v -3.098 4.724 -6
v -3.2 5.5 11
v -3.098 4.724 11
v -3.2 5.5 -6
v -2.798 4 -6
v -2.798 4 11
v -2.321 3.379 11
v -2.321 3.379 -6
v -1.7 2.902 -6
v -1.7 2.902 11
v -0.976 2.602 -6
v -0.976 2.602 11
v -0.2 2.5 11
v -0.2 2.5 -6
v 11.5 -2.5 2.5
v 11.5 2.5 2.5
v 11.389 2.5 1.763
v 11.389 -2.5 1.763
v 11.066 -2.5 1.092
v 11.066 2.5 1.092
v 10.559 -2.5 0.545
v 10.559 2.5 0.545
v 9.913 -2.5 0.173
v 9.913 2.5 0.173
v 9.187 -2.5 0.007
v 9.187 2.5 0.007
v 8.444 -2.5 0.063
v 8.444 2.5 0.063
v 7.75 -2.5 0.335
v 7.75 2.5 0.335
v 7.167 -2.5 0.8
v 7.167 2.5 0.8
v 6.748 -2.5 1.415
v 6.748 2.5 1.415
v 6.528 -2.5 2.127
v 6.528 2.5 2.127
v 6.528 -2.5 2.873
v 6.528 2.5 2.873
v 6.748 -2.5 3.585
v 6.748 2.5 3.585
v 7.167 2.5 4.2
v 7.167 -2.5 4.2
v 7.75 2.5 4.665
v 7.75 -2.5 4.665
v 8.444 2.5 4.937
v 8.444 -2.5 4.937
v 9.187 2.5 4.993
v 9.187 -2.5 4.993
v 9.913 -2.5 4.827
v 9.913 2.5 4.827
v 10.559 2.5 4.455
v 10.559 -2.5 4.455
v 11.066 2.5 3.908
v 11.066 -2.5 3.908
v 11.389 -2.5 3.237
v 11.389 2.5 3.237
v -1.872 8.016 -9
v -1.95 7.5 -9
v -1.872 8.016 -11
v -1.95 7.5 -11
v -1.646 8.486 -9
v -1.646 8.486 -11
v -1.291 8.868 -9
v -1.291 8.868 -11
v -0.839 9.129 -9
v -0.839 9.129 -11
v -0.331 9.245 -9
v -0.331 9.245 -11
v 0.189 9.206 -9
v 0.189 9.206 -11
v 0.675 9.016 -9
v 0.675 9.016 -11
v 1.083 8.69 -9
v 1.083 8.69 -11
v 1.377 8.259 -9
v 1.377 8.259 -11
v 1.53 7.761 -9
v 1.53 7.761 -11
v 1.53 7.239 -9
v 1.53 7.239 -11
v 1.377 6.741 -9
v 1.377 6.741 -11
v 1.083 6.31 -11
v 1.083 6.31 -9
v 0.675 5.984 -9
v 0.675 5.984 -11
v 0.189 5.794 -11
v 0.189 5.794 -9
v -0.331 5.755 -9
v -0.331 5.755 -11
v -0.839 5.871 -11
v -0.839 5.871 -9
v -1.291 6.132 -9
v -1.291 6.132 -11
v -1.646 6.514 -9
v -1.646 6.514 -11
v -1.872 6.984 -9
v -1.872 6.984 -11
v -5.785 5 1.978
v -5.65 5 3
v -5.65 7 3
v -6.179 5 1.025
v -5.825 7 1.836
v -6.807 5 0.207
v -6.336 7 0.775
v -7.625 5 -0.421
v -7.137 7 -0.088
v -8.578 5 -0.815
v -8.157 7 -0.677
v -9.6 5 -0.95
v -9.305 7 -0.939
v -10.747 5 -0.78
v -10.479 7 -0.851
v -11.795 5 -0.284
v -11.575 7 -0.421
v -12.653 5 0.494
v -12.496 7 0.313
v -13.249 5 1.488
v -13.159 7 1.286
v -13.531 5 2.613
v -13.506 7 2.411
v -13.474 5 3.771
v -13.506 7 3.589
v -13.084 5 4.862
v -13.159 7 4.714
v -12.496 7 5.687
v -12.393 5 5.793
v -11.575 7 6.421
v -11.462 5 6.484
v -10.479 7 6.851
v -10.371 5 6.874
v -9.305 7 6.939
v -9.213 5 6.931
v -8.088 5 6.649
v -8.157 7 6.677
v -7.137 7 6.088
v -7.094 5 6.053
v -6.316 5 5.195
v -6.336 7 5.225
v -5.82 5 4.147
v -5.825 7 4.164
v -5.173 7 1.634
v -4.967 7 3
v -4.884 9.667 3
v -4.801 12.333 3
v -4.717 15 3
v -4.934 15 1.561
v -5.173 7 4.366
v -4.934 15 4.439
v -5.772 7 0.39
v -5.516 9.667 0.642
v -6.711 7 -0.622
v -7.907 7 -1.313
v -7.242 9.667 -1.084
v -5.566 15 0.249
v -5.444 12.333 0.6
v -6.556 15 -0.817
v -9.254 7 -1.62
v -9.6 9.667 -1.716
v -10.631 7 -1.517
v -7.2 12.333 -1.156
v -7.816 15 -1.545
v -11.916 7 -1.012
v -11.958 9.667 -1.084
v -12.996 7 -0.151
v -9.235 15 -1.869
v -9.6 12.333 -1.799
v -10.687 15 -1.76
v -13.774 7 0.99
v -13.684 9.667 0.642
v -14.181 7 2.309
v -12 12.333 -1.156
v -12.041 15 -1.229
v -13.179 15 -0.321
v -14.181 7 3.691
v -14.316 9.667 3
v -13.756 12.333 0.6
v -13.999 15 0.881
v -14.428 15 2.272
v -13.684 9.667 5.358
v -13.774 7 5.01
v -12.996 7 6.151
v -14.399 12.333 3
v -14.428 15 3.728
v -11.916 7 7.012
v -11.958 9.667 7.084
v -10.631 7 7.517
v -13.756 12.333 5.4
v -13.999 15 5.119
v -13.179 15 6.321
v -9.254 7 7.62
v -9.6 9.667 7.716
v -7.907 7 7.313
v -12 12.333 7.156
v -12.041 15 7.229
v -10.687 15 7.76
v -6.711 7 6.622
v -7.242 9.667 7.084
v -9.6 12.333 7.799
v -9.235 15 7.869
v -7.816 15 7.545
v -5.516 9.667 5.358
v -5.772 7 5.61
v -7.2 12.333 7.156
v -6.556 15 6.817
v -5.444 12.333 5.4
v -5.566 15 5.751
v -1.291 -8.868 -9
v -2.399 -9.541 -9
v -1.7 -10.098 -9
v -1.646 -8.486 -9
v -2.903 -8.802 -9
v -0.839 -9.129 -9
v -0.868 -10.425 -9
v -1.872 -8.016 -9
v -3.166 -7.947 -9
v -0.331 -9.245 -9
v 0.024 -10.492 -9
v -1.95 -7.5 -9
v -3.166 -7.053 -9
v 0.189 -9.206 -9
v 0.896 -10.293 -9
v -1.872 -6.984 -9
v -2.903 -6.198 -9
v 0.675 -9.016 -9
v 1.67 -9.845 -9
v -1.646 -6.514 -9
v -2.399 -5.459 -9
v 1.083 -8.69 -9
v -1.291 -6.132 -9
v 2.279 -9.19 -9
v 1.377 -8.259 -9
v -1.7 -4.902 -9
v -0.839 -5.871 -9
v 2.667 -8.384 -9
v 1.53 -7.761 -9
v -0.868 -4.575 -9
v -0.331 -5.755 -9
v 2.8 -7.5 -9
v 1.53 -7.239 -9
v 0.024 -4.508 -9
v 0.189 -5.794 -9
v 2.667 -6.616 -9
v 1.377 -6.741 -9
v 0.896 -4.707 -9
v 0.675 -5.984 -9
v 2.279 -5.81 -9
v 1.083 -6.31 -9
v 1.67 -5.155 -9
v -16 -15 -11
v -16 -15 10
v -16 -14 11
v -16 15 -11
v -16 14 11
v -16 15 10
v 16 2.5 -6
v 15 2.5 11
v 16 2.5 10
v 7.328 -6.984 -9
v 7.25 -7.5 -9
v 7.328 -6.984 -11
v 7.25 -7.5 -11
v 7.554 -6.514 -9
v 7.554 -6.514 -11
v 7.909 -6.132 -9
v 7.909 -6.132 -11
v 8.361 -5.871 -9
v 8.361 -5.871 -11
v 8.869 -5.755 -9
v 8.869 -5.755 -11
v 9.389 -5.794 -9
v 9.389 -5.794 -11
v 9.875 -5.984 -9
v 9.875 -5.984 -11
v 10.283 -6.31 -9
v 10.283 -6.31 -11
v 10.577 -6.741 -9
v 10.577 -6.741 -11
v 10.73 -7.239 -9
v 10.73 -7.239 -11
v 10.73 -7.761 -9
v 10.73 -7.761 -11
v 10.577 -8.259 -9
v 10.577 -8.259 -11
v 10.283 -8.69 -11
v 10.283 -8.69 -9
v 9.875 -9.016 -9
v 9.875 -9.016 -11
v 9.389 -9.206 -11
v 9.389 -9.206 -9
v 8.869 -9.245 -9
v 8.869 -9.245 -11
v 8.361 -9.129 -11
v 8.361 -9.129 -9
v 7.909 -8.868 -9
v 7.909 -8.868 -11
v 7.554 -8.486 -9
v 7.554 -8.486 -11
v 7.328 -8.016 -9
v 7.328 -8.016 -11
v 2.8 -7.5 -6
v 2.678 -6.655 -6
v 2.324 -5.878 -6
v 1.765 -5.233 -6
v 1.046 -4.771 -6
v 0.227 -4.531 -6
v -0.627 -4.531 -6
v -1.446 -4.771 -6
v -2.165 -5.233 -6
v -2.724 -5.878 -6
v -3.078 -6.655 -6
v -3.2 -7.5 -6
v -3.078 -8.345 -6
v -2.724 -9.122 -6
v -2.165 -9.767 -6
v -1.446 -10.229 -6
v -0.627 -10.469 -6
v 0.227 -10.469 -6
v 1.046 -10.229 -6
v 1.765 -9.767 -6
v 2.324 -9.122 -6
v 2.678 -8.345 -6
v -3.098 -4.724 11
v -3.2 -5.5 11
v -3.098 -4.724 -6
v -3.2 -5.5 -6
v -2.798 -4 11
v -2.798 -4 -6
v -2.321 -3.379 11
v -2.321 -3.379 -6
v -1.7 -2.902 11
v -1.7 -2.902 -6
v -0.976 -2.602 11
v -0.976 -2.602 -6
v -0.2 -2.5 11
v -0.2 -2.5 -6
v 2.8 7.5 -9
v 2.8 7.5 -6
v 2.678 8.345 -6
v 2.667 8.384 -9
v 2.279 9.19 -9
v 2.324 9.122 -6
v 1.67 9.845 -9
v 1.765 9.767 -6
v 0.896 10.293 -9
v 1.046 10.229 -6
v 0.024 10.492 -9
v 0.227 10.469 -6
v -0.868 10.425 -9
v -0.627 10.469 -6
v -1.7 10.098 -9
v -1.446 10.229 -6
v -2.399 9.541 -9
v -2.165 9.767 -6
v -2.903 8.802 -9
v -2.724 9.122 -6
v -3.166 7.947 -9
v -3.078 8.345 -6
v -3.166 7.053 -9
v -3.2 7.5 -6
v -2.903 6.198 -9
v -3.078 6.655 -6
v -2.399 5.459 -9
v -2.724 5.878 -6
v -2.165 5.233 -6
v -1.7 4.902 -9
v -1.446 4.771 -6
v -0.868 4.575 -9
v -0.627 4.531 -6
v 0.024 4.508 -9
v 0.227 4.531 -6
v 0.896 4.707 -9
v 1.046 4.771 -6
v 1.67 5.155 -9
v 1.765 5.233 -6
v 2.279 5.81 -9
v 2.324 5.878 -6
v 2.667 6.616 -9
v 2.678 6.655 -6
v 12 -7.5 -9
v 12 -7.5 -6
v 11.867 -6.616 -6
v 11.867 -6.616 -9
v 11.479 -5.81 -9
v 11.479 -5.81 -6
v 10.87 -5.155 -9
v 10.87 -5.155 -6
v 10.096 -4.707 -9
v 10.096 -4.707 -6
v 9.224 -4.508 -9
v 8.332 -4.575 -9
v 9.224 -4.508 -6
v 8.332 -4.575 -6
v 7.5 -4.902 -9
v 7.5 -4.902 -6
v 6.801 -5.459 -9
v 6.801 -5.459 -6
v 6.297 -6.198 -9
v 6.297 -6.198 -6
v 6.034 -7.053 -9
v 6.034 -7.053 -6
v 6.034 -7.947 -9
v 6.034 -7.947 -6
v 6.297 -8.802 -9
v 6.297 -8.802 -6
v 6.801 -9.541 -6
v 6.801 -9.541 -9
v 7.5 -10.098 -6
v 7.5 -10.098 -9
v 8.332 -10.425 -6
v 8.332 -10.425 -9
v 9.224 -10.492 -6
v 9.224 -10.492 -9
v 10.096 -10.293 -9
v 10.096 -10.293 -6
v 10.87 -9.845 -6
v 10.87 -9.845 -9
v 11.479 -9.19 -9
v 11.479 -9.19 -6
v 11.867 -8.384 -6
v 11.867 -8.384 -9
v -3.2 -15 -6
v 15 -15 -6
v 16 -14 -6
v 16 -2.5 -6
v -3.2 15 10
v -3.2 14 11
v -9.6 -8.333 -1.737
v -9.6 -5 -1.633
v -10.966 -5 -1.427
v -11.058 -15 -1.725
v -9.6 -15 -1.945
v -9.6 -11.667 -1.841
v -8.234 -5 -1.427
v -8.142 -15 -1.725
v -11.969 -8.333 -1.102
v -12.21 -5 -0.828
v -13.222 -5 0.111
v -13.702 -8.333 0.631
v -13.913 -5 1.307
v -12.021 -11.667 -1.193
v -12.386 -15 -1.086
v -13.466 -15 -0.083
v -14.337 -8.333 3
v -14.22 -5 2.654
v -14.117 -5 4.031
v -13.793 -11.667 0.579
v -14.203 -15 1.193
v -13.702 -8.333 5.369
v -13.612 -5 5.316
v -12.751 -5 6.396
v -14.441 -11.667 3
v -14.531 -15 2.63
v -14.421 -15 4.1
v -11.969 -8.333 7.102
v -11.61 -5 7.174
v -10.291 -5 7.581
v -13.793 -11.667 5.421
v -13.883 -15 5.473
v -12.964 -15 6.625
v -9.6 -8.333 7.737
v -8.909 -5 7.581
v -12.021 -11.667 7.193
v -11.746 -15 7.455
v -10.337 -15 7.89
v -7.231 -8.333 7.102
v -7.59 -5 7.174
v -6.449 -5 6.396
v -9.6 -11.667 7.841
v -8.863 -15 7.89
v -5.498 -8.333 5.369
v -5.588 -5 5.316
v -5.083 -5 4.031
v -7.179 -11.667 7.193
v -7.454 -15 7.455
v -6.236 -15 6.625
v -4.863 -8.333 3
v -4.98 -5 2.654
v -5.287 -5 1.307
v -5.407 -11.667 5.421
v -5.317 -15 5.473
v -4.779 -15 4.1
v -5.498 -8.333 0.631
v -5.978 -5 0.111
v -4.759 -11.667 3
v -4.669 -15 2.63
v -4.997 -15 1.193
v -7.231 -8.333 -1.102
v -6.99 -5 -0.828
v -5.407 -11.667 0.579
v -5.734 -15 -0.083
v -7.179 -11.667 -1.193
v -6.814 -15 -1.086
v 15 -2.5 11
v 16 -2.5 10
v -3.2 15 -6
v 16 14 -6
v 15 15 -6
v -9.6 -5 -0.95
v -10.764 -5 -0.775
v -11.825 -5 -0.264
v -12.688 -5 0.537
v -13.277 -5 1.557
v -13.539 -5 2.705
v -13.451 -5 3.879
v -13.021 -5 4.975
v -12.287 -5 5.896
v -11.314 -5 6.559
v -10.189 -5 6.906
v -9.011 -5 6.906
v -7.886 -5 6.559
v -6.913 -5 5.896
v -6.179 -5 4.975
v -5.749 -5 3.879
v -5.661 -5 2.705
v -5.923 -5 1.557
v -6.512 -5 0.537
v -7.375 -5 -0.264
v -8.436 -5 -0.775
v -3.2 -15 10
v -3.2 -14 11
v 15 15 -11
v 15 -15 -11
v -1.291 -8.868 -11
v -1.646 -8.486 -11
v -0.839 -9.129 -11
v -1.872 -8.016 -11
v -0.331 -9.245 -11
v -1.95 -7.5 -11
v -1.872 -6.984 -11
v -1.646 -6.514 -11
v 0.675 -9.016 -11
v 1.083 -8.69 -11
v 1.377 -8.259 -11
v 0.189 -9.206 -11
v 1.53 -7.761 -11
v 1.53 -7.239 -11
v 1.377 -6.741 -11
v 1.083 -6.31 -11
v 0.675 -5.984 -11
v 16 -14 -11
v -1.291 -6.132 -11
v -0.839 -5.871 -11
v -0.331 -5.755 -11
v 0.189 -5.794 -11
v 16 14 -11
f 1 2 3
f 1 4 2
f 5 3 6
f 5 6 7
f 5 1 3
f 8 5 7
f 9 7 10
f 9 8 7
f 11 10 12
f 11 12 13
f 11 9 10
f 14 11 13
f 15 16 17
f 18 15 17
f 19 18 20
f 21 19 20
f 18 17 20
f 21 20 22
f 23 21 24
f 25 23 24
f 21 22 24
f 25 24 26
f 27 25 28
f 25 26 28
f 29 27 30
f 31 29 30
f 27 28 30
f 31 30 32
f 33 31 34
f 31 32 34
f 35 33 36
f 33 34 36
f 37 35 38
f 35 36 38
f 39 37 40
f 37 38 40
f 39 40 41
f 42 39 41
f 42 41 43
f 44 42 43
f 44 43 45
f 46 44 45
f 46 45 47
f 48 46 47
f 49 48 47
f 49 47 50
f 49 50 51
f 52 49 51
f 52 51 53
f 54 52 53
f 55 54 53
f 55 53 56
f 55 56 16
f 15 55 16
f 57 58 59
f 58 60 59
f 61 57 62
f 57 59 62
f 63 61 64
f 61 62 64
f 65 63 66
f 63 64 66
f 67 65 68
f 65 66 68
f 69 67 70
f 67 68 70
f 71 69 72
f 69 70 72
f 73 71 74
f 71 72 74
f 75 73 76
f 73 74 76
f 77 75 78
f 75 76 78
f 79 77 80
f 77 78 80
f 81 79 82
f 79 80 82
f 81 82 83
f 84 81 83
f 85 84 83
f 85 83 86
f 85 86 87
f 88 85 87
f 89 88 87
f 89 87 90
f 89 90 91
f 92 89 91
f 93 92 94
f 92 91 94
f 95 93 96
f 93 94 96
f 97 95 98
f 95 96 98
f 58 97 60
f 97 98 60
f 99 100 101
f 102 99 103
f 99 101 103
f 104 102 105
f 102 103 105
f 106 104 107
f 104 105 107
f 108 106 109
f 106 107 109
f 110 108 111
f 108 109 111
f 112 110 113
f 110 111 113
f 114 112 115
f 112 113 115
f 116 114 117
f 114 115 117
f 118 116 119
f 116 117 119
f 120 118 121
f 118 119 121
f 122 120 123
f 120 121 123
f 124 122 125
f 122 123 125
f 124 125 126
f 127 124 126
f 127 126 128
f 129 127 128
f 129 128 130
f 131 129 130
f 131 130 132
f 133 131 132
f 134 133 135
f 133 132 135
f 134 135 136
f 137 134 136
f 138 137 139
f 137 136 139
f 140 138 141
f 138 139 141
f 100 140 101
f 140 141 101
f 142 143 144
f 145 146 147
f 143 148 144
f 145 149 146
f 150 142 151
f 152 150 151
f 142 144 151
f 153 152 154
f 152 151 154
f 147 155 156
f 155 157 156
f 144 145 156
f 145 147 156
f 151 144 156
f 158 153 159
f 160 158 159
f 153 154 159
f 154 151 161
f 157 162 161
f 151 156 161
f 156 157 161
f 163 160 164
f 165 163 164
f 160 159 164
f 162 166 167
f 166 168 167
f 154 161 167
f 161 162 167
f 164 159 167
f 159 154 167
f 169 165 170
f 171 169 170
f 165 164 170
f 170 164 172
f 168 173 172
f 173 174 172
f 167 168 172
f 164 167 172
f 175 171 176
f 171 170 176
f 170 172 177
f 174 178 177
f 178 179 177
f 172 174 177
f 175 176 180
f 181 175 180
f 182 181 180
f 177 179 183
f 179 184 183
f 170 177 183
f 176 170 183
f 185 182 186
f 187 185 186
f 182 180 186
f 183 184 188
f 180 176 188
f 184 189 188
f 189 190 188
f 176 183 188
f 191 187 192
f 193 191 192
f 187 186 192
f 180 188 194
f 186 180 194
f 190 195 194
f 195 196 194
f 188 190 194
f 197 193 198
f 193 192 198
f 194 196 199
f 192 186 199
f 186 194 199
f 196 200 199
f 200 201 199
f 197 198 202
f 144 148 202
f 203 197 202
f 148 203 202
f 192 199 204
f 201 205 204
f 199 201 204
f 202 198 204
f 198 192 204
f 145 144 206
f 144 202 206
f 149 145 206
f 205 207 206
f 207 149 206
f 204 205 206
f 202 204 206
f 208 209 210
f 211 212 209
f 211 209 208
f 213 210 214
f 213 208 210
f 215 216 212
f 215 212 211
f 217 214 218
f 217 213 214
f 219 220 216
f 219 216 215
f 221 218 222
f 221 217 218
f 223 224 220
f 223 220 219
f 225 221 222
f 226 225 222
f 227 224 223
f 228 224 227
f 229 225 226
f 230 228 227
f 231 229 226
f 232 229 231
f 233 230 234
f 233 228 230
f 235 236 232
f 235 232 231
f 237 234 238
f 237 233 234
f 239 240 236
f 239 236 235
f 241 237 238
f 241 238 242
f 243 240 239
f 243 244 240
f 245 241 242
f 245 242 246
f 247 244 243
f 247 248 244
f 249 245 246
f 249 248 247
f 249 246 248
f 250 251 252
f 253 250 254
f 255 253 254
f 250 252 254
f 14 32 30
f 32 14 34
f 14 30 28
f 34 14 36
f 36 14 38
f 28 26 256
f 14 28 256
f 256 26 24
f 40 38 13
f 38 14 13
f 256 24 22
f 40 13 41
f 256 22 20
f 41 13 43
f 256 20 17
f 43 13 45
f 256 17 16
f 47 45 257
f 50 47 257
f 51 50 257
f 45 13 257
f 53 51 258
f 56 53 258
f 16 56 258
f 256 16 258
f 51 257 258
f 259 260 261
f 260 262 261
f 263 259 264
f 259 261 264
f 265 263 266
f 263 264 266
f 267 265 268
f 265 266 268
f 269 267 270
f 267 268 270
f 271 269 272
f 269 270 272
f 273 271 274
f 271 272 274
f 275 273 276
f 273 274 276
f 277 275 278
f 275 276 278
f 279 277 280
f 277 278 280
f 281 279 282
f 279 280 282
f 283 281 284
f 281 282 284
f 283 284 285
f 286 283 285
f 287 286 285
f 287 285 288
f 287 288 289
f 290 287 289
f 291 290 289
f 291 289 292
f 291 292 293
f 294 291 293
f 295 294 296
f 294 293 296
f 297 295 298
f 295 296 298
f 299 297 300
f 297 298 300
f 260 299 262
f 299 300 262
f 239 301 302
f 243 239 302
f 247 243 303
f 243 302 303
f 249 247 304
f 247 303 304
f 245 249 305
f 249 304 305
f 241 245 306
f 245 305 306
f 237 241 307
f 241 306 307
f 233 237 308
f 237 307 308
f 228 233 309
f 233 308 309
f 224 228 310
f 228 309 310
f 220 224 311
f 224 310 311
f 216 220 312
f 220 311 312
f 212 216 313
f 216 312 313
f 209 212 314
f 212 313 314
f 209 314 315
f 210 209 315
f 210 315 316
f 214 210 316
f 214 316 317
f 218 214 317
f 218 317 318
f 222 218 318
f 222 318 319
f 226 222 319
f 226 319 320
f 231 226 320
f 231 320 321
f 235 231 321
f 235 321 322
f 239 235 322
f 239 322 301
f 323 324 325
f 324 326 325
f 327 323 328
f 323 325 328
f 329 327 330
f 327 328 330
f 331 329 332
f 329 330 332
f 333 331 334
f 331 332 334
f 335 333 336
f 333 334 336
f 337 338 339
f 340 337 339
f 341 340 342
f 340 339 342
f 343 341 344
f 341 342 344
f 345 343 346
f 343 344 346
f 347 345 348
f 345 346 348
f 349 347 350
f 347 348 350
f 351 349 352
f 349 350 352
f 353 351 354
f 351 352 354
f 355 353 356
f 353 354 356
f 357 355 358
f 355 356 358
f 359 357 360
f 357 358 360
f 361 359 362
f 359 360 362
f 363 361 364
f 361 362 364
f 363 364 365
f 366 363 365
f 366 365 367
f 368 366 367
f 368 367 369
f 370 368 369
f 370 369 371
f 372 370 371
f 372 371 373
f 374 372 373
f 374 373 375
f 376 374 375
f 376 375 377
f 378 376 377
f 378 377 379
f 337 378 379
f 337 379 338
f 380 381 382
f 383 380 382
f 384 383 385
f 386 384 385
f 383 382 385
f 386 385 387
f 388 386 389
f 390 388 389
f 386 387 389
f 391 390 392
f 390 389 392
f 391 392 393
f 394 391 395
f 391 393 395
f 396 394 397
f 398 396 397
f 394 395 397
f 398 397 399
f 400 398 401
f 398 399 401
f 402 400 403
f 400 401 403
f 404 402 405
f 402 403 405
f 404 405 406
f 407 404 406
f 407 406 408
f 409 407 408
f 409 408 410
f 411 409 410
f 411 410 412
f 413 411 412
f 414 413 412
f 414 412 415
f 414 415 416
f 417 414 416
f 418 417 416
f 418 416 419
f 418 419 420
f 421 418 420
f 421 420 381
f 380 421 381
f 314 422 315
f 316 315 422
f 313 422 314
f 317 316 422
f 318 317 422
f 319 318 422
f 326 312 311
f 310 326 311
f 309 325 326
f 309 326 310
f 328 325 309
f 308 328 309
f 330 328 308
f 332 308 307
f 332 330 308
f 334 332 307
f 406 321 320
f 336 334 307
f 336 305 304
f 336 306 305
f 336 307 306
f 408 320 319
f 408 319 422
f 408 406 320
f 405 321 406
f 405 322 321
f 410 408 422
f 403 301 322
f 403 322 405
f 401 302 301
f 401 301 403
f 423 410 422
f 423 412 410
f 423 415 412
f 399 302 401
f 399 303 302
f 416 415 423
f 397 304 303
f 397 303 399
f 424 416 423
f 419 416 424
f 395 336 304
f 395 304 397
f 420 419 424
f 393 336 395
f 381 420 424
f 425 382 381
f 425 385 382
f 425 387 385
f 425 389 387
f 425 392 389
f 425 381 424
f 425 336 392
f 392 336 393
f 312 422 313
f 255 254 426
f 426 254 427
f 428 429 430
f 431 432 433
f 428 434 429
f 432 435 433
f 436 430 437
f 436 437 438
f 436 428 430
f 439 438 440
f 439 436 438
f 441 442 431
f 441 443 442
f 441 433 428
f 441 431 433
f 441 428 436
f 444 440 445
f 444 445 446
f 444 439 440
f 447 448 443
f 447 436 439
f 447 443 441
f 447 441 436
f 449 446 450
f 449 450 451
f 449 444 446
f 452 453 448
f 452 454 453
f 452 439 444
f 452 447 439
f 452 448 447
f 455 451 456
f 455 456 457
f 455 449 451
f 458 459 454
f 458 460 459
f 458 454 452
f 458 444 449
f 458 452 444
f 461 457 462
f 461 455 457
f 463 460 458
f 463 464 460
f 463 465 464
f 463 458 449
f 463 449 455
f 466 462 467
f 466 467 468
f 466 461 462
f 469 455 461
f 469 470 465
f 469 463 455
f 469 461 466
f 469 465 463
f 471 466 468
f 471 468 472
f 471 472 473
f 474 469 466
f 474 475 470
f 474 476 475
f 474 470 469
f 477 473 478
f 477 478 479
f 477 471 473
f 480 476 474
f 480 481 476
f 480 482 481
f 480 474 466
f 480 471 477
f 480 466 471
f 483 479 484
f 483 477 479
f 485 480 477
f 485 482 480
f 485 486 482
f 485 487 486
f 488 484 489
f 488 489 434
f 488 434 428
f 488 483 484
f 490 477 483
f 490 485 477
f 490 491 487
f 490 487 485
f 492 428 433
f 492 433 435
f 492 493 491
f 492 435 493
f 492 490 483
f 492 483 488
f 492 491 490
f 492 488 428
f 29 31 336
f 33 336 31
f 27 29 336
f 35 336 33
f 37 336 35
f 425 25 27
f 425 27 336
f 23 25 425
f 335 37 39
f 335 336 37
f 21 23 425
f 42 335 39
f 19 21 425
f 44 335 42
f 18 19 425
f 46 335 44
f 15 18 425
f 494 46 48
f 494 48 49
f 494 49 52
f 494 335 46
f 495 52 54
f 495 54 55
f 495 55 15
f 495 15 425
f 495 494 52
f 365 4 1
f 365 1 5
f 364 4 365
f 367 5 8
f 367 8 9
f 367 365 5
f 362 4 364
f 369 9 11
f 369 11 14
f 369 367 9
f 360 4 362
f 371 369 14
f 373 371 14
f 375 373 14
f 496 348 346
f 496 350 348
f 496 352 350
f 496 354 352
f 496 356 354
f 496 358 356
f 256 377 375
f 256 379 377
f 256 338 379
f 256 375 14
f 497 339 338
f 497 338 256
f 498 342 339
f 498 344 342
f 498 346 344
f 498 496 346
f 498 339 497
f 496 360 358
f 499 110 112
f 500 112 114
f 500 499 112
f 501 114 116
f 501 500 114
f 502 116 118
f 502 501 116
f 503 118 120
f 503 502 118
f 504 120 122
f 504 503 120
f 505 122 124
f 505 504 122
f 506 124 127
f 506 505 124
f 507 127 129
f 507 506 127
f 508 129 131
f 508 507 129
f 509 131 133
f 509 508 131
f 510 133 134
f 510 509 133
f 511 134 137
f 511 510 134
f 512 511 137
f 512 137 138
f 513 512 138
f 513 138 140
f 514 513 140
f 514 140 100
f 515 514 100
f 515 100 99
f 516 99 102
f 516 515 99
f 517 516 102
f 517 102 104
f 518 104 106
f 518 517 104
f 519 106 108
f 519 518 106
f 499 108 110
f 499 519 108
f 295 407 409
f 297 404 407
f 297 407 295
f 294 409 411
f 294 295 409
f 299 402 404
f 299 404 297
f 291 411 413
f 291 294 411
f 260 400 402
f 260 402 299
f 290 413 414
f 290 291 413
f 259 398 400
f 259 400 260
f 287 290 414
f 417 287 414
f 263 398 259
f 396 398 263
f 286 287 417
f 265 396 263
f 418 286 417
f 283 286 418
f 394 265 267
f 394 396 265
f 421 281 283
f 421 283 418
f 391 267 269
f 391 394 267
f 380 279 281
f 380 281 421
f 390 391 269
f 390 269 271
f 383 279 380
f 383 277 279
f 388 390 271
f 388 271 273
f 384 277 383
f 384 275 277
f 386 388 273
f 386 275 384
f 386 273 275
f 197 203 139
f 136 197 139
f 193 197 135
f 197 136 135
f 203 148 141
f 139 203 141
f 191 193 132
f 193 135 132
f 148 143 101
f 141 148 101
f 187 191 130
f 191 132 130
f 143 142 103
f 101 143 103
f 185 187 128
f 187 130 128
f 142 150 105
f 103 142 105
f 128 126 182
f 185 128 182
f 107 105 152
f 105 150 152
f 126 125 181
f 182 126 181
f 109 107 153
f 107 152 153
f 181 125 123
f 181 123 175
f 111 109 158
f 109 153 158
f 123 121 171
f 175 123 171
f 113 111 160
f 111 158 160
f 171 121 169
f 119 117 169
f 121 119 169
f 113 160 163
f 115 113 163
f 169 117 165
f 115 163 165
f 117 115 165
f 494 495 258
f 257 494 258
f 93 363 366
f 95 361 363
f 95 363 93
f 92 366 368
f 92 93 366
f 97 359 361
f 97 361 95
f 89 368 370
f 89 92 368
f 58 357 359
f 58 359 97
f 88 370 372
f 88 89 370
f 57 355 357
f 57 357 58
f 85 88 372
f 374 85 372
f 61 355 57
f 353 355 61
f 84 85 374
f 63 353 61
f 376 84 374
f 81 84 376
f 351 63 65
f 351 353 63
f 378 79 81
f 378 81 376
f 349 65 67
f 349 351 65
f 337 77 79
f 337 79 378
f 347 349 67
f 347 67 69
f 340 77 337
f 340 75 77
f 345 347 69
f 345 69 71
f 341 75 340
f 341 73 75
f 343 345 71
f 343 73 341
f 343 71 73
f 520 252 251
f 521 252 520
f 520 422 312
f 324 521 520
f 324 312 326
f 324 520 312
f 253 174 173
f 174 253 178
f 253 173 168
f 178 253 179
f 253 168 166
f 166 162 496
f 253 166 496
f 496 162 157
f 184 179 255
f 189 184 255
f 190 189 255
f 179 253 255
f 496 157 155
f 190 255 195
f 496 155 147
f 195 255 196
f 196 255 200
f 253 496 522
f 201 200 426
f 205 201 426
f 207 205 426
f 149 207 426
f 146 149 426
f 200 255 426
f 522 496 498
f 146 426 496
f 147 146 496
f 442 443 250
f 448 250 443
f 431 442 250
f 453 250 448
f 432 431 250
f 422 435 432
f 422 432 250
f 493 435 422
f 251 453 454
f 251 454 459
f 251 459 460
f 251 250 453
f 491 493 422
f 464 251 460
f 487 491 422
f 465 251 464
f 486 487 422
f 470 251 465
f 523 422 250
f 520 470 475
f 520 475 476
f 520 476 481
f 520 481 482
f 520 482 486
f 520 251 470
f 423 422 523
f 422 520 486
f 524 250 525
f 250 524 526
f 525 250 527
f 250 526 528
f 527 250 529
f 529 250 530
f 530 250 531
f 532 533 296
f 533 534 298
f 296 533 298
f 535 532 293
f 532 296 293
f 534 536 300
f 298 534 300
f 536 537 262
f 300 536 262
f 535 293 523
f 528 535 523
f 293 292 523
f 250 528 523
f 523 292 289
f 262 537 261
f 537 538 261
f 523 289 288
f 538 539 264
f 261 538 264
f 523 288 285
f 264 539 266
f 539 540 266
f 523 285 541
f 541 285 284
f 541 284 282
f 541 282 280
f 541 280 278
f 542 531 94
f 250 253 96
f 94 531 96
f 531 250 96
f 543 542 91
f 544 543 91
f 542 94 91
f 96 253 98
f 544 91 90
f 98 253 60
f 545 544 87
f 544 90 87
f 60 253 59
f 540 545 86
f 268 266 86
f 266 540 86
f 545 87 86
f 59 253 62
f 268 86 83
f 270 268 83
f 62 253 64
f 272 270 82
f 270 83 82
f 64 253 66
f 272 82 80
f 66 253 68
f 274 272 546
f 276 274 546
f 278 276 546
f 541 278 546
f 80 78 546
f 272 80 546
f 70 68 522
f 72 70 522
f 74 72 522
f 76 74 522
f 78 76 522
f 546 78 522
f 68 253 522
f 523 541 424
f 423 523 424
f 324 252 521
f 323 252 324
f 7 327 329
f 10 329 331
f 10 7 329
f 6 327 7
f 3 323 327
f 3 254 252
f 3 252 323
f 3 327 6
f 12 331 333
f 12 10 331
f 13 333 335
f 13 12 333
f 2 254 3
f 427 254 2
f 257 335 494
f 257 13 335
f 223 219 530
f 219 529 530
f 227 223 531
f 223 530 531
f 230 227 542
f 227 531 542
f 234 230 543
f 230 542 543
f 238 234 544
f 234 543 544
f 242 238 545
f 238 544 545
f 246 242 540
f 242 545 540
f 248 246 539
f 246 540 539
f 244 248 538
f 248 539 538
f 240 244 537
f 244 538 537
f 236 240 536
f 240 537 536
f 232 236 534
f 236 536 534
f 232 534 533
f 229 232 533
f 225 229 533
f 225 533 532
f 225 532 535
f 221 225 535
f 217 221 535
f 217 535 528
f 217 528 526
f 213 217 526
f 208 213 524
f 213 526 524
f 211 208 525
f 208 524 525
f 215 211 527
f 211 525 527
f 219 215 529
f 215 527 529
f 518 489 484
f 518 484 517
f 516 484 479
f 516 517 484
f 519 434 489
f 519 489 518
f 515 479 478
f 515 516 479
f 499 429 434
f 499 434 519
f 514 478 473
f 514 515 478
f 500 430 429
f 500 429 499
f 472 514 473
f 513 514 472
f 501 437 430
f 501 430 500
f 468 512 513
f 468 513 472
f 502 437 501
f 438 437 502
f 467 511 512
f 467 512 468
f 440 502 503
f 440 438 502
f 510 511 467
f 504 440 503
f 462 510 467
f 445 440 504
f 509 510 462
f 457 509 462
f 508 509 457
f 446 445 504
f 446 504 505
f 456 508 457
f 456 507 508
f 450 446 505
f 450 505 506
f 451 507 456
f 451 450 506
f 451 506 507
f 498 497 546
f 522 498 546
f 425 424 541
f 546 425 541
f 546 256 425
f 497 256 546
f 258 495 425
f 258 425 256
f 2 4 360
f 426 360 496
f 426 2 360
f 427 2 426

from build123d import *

# Parameters (mm, degrees)
SKETCH_2_W                = 32
SKETCH_2_H                = 30
EXTRUDE_1_DEPTH           = 11
HOLE_WIZARD_1_D           = 3.5
HOLE_WIZARD_1_CBORE_D     = 6
HOLE_WIZARD_1_CBORE_DEPTH = 20
SKETCH_11_W               = 19.2
SKETCH_11_H               = 12.5
CUT_EXTRUDE_1_DEPTH       = 17
HOLE_WIZARD_M6_1_D        = 5
CHAMFER_1_SIZE            = 1
FILLET_1_R                = 3


# Read off the part's stored shape, not the designer's step: 1/8 Rc 螺纹孔1
with BuildPart() as part:
    # 草图2 → 凸台-拉伸1 (new, symmetric)
    with BuildSketch(Plane.XY):
        Rectangle(SKETCH_2_W, SKETCH_2_H)
    extrude(amount=EXTRUDE_1_DEPTH, both=True)

    # 打孔尺寸根据内六角圆柱头螺钉的类型1 (through all)
    with Locations(Plane.XY.offset(11)):
        with Locations((-0.2, 7.5), (-0.2, -7.5), (9, -7.5)):
            CounterBoreHole(HOLE_WIZARD_1_D / 2, HOLE_WIZARD_1_CBORE_D / 2, HOLE_WIZARD_1_CBORE_DEPTH)

    # 草图11 → 切除-拉伸1 (cut)
    with BuildSketch(Plane.XY.offset(11)):
        with Locations((6.4, -8.75)):
            Rectangle(SKETCH_11_W, SKETCH_11_H)
        with Locations((6.4, 8.75)):
            Rectangle(SKETCH_11_W, SKETCH_11_H)
    extrude(amount=-CUT_EXTRUDE_1_DEPTH, mode=Mode.SUBTRACT)

    # M6 螺纹孔1 (through all)
    with Locations(Plane(origin=(0, -2.5, 0), x_dir=(-1, 0, 0), z_dir=(0, -1, 0))):
        with Locations((-9, -2.5)):
            Hole(HOLE_WIZARD_M6_1_D / 2)

    # 草图9 → 1/8 Rc 螺纹孔2 (revolve, cut)
    with BuildSketch(Plane(origin=(-9.6, -15, 3), x_dir=(0, 0, -1), z_dir=(1, 0, 0))):
        Polygon((0, 0), (0, 22.373399445), (3.95, 20), (3.95, 10), (4.632996789, 10), (4.945163, 0), align=None)
    revolve(axis=Axis((-9.6, -21.35, 3), (0, 1, 0)), mode=Mode.SUBTRACT)

    # 1/8 Rc 螺纹孔1 outline → 1/8 Rc 螺纹孔1 (revolve, cut)
    with BuildSketch(Plane(origin=(-9.6, 0, 3), x_dir=(1, 0, 0), z_dir=(0, 0, 1))):
        Polygon((4.632997031, 7), (4.88273, 15), (0, 15), (0, 7.373399445), (3.95, 5), (3.95, 7), align=None)
    revolve(axis=Axis((-9.6, 0, 3), (0, 1, 0)), mode=Mode.SUBTRACT)

    # 倒角1
    chamfer_1_edges = [part.edges().sort_by_distance(p)[0] for p in [
        (-9.6, -15, 11),
        (16, 0, 11),
        (16, -15, -8.5),
        (-9.6, 15, 11),
        (16, 15, -8.5),
    ]]
    chamfer(chamfer_1_edges, length=CHAMFER_1_SIZE)

    # 圆角1
    fillet_1_edges = [part.edges().sort_by_distance(p)[0] for p in [
        (-3.2, -2.5, 2.5),
        (-3.2, 2.5, 2.5),
    ]]
    fillet(fillet_1_edges, radius=FILLET_1_R)


solid = part.part
